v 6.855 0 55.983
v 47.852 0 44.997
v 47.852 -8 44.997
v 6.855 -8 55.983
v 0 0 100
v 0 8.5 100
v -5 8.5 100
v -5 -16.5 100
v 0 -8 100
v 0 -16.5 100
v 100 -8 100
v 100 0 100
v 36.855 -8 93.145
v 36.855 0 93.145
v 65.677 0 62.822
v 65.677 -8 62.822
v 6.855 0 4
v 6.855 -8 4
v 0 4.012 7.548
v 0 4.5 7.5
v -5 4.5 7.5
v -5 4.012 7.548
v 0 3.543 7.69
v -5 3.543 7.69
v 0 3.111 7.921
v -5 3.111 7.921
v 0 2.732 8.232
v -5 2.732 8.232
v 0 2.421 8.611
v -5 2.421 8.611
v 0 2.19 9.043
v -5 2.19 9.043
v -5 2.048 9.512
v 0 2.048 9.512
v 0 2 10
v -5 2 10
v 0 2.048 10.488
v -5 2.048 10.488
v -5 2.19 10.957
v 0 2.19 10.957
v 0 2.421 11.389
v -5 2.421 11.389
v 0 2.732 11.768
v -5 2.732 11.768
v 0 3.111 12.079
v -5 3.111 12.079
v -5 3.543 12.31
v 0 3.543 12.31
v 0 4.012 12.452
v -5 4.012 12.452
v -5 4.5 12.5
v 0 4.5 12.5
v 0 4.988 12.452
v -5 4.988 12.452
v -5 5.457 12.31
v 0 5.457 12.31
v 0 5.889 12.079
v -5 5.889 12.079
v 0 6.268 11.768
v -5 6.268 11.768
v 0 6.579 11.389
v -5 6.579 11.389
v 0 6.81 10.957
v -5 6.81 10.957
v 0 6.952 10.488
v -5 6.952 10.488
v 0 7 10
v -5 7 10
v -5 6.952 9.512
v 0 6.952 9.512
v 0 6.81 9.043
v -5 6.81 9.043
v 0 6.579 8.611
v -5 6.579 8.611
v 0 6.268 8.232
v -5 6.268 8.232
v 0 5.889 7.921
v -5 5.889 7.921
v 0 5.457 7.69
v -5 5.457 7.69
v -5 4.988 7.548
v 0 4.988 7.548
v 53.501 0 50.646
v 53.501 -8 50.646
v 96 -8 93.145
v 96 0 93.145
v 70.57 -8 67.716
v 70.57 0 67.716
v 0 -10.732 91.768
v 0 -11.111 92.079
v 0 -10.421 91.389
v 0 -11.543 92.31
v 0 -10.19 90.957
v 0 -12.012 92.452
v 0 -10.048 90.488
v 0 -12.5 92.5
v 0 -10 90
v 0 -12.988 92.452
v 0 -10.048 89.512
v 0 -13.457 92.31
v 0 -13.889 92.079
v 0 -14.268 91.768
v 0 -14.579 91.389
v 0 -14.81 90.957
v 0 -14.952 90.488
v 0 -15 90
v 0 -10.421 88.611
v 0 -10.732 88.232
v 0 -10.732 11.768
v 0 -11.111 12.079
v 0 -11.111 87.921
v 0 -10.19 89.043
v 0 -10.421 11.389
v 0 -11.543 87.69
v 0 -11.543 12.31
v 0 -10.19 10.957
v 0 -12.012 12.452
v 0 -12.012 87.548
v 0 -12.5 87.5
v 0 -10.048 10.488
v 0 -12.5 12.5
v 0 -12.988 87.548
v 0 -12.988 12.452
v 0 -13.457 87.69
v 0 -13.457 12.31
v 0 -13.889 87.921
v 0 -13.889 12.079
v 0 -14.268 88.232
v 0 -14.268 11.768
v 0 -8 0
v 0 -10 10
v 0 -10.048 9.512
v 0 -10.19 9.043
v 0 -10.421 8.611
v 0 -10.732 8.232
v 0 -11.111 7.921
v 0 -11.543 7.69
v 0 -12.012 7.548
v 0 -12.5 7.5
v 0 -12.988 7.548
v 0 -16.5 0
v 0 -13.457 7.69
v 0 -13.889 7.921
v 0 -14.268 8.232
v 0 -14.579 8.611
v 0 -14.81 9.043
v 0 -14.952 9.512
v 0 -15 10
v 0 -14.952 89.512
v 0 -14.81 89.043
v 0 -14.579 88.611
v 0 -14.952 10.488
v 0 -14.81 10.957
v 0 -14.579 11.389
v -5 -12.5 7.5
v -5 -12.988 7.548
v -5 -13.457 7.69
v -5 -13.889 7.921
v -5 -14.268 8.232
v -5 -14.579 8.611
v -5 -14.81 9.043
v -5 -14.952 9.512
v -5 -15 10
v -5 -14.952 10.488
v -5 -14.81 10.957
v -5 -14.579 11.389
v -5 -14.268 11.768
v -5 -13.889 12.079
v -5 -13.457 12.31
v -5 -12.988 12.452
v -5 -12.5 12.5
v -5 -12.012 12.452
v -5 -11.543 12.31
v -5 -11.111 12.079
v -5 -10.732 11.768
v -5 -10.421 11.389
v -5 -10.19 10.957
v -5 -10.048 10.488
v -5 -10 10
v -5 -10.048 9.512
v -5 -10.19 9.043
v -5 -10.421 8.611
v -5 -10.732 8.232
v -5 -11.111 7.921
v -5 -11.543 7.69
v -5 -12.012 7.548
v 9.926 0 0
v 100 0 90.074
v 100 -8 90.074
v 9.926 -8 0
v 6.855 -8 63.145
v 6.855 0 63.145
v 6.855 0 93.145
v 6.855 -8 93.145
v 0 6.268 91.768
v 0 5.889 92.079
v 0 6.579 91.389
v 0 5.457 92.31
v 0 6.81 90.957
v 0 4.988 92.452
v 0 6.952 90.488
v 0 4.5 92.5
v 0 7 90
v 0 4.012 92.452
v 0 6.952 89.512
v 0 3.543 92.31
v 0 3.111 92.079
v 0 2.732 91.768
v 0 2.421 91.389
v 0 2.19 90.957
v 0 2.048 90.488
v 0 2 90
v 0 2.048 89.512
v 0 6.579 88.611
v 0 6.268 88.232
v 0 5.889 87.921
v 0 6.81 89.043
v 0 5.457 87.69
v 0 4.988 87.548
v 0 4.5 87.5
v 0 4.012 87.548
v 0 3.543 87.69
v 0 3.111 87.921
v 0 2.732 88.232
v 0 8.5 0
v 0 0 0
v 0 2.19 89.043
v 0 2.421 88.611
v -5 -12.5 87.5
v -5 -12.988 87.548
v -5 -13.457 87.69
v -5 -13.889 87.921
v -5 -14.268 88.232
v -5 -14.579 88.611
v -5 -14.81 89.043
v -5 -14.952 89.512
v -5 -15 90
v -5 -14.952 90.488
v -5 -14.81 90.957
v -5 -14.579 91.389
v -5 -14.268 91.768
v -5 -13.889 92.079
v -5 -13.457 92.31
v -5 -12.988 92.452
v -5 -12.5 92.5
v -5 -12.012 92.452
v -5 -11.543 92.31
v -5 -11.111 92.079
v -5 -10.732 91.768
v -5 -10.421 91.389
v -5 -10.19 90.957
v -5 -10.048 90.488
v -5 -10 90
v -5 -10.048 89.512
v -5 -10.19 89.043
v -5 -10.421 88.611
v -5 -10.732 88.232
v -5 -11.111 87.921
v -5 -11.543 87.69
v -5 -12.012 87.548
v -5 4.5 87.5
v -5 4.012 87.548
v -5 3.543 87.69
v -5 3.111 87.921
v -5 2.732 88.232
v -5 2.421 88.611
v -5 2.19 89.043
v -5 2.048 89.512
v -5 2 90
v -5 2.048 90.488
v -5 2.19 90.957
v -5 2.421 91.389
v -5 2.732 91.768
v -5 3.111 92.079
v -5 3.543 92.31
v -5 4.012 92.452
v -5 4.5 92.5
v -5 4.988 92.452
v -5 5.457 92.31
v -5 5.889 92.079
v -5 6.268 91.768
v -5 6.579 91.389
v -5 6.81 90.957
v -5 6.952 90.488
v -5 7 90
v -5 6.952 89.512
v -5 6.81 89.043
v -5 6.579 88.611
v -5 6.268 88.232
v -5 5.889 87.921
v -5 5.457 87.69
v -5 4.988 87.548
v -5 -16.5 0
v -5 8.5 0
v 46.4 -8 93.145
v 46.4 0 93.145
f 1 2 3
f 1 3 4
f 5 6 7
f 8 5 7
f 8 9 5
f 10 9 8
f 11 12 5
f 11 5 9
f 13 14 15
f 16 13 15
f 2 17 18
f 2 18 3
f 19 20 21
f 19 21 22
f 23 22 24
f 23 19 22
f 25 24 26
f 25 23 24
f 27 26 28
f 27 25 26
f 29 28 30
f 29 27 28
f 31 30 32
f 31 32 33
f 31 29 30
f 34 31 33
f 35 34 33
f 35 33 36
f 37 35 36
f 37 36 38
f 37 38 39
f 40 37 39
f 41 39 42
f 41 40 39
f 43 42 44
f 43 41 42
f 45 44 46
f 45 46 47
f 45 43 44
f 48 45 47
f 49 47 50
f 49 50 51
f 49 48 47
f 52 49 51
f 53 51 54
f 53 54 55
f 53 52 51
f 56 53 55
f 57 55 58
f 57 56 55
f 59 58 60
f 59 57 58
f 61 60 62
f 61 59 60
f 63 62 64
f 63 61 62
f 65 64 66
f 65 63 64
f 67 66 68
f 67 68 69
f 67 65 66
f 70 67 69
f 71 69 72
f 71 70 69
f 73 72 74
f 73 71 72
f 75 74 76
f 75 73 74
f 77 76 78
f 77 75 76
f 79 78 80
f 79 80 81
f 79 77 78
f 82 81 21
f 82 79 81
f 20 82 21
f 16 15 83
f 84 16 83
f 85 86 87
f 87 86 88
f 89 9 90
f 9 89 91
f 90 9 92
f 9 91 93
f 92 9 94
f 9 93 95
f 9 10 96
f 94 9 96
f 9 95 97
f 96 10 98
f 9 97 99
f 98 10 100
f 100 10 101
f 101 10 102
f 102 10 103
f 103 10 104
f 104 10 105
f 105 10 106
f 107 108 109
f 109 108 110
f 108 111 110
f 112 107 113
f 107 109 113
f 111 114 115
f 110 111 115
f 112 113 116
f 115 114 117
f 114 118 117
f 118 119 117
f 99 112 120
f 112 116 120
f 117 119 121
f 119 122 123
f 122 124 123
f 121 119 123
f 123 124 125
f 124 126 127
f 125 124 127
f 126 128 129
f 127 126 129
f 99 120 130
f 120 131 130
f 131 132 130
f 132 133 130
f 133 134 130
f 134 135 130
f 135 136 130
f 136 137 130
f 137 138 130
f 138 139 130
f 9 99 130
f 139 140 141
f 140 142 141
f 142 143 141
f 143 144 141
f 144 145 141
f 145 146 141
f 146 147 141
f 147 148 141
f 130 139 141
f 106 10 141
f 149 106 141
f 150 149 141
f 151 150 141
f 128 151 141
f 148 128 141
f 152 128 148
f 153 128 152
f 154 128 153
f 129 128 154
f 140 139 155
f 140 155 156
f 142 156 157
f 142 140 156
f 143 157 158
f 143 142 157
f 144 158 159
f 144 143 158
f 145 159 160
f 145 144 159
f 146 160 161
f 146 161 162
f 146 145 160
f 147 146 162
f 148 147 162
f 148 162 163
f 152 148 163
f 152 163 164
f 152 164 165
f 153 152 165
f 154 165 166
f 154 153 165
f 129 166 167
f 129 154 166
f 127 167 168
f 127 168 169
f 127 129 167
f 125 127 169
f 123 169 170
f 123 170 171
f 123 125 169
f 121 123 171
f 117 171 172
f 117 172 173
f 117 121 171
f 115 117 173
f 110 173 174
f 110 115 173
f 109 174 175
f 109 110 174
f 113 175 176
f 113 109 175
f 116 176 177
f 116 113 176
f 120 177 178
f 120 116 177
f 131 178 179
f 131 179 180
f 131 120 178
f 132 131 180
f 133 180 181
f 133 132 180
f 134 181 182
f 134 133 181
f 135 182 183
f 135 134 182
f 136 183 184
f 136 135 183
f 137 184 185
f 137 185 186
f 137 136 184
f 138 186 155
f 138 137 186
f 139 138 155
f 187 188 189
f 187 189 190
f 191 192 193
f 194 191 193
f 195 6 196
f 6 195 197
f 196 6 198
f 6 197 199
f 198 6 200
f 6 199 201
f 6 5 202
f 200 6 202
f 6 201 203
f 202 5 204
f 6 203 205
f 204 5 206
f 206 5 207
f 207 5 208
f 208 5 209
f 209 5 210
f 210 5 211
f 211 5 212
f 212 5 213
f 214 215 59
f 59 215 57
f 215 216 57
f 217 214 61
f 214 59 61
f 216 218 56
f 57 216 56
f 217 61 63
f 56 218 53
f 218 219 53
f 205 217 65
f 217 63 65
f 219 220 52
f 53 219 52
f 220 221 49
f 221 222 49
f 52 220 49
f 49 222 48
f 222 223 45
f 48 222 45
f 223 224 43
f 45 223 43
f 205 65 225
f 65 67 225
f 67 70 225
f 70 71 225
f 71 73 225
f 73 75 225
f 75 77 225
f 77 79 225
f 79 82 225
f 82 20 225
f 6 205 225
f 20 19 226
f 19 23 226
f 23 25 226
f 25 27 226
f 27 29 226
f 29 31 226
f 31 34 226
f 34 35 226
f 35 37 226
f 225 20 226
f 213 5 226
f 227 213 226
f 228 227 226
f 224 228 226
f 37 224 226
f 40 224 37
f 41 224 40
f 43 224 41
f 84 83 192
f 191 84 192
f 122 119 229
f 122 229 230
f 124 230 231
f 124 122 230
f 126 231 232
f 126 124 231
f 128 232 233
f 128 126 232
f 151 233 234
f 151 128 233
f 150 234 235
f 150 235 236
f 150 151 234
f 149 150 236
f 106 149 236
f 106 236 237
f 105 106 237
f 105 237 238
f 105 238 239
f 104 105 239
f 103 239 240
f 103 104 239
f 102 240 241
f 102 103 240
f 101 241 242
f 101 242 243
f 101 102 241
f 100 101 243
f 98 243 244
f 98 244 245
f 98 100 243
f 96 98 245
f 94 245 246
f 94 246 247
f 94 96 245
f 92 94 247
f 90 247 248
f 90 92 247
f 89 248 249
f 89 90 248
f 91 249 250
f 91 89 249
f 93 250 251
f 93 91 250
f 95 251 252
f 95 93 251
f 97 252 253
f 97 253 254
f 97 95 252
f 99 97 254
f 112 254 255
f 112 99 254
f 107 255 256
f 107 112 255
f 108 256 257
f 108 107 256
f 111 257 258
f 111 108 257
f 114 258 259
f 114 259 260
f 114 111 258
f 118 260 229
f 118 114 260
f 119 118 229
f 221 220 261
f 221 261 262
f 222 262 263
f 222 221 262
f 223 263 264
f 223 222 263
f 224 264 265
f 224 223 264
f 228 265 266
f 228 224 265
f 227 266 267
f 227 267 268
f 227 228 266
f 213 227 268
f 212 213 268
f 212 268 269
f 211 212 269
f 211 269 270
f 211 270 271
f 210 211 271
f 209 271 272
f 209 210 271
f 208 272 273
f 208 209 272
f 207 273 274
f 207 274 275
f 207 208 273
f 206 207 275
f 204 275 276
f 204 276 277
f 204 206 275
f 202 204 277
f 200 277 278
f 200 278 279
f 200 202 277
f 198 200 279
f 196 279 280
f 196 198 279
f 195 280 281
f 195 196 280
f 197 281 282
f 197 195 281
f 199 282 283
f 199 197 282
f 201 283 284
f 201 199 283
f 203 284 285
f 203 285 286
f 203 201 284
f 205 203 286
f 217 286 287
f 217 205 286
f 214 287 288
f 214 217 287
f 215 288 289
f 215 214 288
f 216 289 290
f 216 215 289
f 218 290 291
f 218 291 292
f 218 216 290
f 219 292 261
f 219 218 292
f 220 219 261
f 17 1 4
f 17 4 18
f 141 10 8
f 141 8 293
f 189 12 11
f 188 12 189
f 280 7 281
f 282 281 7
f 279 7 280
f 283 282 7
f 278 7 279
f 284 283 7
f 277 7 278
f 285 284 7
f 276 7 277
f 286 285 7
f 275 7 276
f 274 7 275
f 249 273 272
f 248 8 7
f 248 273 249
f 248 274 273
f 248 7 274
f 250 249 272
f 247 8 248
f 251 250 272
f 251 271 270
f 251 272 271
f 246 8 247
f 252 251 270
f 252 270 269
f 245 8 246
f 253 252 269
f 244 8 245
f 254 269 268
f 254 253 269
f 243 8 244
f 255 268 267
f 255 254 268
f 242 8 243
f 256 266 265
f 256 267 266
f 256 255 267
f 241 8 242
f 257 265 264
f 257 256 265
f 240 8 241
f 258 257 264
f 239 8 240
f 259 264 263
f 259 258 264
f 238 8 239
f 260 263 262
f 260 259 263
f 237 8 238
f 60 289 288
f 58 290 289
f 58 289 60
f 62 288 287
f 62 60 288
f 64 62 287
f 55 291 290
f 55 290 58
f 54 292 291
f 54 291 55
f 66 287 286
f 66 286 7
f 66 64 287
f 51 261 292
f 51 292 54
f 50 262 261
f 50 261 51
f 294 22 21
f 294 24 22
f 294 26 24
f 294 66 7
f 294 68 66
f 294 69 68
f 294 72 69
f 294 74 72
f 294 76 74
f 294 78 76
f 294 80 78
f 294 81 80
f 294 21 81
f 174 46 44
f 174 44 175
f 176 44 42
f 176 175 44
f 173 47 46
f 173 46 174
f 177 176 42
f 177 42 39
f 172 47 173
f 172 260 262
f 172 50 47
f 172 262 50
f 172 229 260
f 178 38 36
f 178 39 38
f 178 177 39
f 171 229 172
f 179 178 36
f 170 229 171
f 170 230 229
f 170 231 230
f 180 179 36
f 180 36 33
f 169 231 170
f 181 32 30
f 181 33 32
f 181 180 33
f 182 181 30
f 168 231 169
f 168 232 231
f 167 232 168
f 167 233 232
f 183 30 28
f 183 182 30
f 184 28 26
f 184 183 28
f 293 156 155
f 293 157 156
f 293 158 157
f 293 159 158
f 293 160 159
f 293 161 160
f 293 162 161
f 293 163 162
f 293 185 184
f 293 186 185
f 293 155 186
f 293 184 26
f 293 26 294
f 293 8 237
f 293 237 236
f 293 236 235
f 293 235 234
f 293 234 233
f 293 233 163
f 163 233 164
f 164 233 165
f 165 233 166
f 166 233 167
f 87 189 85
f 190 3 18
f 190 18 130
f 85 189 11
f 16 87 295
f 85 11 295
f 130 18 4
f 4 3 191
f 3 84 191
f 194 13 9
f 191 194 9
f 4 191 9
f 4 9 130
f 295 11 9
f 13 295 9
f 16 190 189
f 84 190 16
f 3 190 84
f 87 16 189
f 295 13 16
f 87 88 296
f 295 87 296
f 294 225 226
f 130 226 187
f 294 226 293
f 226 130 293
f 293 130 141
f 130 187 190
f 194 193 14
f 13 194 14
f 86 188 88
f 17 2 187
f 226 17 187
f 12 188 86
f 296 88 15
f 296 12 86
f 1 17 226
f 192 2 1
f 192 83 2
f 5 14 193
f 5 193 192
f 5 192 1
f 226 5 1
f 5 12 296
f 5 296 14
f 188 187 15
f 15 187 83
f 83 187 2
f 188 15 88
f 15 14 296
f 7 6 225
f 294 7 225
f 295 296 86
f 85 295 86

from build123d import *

# Parameters (mm, degrees)
PAD_DEPTH    = 8
SKETCH001_W  = 100
SKETCH001_H  = 25
SKETCH001_R  = 2.5
PAD001_DEPTH = 5


with BuildPart() as part:
    # Sketch → Pad (new body)
    with BuildSketch(Plane.XZ):
        Polygon((0, 0), (0, 100), (100, 100), (100, 90.074147), (9.925853, 0), align=None)
        Polygon((6.854785, 93.145215), (36.854785, 93.145215), (65.676567, 62.821781), (53.501145, 50.64636), (6.854785, 63.145215), align=None, mode=Mode.SUBTRACT)
        Polygon((47.852116, 44.997331), (6.854785, 55.982532), (6.854785, 4), align=None, mode=Mode.SUBTRACT)
        Polygon((70.570346, 67.715561), (46.399999, 93.145215), (96, 93.145215), align=None, mode=Mode.SUBTRACT)
    extrude(amount=PAD_DEPTH)

    # Sketch001 (on DatumPlane) → Pad001 (join)
    with BuildSketch(Plane(origin=(0, 0, 0), x_dir=(0, 0, -1), z_dir=(-1, 0, 0))):
        with Locations((-50, 4)):
            Rectangle(SKETCH001_W, SKETCH001_H)
        with Locations((-90, 12.5)):
            Circle(SKETCH001_R, mode=Mode.SUBTRACT)
        with Locations((-10, 12.5)):
            Circle(SKETCH001_R, mode=Mode.SUBTRACT)
        with Locations((-90, -4.5)):
            Circle(SKETCH001_R, mode=Mode.SUBTRACT)
        with Locations((-10, -4.5)):
            Circle(SKETCH001_R, mode=Mode.SUBTRACT)
    extrude(amount=PAD001_DEPTH)


solid = part.part
